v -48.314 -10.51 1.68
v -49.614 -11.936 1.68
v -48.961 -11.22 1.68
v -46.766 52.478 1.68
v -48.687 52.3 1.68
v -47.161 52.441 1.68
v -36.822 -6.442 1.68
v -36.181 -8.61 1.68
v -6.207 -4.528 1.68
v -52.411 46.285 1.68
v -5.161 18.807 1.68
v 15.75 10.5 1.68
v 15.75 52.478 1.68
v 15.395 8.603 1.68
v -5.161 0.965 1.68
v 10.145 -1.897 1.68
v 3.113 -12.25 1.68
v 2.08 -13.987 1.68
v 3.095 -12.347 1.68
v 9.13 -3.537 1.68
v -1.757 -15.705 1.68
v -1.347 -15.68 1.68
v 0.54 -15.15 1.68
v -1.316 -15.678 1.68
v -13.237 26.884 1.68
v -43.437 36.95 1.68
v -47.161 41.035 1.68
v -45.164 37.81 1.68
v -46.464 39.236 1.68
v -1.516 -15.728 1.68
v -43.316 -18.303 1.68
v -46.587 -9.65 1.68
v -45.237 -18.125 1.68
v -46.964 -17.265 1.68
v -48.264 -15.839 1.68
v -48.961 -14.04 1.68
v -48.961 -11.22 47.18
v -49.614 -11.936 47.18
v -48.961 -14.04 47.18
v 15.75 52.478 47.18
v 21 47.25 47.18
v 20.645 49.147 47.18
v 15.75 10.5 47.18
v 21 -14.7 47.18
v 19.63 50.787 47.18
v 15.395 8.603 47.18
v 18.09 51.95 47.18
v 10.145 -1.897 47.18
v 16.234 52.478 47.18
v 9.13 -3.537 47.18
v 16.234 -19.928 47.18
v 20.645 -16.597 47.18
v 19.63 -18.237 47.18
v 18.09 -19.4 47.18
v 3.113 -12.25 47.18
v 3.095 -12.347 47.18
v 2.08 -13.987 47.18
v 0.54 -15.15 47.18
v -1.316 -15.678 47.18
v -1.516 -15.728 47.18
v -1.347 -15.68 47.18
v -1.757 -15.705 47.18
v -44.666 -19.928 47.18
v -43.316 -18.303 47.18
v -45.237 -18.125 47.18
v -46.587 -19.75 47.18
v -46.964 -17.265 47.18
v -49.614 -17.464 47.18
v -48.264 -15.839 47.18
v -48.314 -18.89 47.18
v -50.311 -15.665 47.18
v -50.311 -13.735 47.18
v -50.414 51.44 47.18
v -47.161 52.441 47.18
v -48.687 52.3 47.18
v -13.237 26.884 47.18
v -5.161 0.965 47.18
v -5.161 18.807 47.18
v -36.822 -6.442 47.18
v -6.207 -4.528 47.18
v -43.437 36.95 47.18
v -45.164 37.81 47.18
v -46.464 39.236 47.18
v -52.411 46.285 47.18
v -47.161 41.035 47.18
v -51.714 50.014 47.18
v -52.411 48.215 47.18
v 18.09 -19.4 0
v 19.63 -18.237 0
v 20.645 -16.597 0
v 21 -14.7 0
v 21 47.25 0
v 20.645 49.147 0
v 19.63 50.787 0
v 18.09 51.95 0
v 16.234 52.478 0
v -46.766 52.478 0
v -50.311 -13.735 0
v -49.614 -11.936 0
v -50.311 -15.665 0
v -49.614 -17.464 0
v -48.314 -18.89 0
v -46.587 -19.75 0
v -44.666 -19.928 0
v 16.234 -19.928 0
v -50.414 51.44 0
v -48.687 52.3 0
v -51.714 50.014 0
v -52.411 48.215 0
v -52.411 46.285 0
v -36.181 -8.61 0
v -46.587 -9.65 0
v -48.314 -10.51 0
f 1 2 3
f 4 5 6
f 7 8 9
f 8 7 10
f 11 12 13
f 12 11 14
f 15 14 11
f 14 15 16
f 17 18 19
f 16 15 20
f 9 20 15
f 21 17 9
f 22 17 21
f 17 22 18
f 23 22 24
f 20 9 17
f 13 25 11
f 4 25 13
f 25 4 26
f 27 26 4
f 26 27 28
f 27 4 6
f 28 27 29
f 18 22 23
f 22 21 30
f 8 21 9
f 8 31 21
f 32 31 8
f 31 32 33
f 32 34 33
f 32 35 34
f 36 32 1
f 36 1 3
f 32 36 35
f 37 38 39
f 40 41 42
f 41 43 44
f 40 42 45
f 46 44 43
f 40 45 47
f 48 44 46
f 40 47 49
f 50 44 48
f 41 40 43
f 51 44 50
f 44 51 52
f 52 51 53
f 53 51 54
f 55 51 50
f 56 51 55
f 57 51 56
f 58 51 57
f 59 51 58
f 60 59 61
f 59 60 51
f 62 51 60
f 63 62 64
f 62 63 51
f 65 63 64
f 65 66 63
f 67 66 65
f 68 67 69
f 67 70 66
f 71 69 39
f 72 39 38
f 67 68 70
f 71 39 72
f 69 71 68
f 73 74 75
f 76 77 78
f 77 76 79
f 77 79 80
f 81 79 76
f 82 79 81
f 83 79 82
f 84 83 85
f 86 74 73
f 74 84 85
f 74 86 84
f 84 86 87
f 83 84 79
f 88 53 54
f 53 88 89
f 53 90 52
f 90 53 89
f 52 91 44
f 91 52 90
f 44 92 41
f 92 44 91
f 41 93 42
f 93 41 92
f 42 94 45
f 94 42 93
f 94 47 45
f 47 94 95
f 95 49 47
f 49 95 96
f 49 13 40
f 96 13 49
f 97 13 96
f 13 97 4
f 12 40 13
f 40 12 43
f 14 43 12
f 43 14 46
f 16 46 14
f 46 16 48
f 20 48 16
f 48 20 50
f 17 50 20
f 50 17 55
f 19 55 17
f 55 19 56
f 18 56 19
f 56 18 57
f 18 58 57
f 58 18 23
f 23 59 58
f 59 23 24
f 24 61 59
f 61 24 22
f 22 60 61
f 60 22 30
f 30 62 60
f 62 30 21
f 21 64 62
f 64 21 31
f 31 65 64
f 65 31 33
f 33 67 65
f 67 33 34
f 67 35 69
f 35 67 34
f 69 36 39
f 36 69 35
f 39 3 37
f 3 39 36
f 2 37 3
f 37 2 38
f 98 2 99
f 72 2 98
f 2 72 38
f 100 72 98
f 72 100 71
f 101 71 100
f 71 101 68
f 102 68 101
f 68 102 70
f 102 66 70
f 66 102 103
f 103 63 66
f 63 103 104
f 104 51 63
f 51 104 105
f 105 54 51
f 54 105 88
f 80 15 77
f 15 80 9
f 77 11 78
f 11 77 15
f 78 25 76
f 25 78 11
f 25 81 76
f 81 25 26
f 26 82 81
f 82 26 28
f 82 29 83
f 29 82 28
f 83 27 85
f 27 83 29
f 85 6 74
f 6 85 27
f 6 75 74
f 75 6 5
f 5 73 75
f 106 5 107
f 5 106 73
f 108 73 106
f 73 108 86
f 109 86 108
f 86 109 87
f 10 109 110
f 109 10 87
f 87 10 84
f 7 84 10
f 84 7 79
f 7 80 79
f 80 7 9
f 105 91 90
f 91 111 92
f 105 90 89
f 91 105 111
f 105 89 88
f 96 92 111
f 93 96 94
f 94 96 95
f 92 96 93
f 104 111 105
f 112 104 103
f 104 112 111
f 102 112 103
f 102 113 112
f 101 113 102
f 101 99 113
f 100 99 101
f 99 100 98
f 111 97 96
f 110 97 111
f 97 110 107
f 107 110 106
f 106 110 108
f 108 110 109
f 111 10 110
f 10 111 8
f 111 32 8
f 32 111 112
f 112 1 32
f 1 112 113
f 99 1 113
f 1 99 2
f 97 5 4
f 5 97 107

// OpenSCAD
// file: polyedge.scad
// Copyright (c) 2024 Robert Eisele ( https://raw.org ). All rights reserved.
// Licensed under the MIT license.

// https://raw.org/code/openscad-polygons-with-rounded-corners/


// Example: polyedge([ [x, y, t], ...]);
// The parameter t has the following options:
// = 0: If t is zero (or left out), the edge is becoming a normal sharp edge like in polygon()
// > 0: If t is positive, the edge will get a round corner with radius t
// < 0: If t is negative, the edge will get an inset of length -t from the original edge


function normalize (v) = v / norm(v);
function sgn(a, b) = sign(a[0] * b[1] - a[1] * b[0]);

module polyedge(pts, $fn=$fn) {

    polygon([for (L1 = [
        for (i = [1 : len(pts)])
        let(
            f = $fn == 0 ? 10 : $fn,
            A = pts[(i - 1)],
            B = pts[(i + 0) % len(pts)],
            C = pts[(i + 1) % len(pts)],

            r = B[2],
            S = [B[0], B[1]],
            a = normalize([A[0] - B[0], A[1] - B[1]]),
            b = normalize([C[0] - B[0], C[1] - B[1]]))

             (len(B) == 2 || B[2] == 0)
                ? [ S ]
                : (r < 0 
                    ? [ S - a * r, S - b * r ]
                    : [let(
                        w = r * sqrt(2 / (1 - a * b) - 1),
                        X = a * w,
                        Y = b * w,
                        M = (a + b) * (r / sqrt(1 - pow(a * b, 2))),
                        b1 = atan2(X[1] - M[1], X[0] - M[0]),
                        b2 = atan2(Y[1] - M[1], Y[0] - M[0]),
                        phi = sgn(a, b) * (sgn(a, b) * (b1 - b2) + 360) % 360,
                        segs = ceil(abs(phi) * f / 360)) 
                            for (j = [0 : segs]) 
                                B + M + [
                                    r * cos(b1 - j / segs * phi), 
                                    r * sin(b1 - j / segs * phi)]])]) for (L2 = L1) L2]); 
}
// main file
include <polyedge.scad>

bl=44.5;
bd=10.5;
g=1;
br=bd/2;
wall=1.68;


module bat() {
    circle(d=bd);
}

module bats() {
    translate([0,bd*2,0]) bat();
    translate([-bd*3.8,-bd*1,0]) bat();
     translate([-1,-bd,0]) bat();
}

module funnel2d() {
    minkowski() {
        circle(br);
        polygon([ 
            [0,0],[br,0],
            [bd,bd],
            [bd,bd*2],
            [bd,bd*4],
            [bd,bd*5],
            
            [-bd*4,bd*5],
            [-bd*4,bd*4],
            [-bd,bd*3],
            [0,bd*2]
        ]);
    };

    minkowski() {
        circle(br);
        polygon([
            [0,0],[br,0],
            [-2,-bd]
        ]);
    };
    translate([-1.8,-bd*0.9,0])
    minkowski() {
        circle(br);
        polygon([
            [0,0],[-bd*4,-bd*5*0.05],
            [-bd*4,-bd*5*0.05-g],[0,-g]
        ]);
    };
}

module side2d() {
    minkowski() {
        circle(br);
        polygon([
            [-bd*4.3,-bd*1.4],[bd+br,-bd*1.4],
            [bd+br,bd*4.5],[-bd*4.5,bd*4.5],
            [-bd*2.8,-bd*1.25]
        ]);
    };
}

module body2d() {
    difference() {
        side2d();
        funnel2d();
    }
}

module body() {
    linear_extrude(bl+g) {
        body2d();
    }
}

module side() {
    linear_extrude(wall) {
        side2d();
    }
}

//funnel2d();
//body2d();
//bats();
translate([0,0,wall]) body();
side();
